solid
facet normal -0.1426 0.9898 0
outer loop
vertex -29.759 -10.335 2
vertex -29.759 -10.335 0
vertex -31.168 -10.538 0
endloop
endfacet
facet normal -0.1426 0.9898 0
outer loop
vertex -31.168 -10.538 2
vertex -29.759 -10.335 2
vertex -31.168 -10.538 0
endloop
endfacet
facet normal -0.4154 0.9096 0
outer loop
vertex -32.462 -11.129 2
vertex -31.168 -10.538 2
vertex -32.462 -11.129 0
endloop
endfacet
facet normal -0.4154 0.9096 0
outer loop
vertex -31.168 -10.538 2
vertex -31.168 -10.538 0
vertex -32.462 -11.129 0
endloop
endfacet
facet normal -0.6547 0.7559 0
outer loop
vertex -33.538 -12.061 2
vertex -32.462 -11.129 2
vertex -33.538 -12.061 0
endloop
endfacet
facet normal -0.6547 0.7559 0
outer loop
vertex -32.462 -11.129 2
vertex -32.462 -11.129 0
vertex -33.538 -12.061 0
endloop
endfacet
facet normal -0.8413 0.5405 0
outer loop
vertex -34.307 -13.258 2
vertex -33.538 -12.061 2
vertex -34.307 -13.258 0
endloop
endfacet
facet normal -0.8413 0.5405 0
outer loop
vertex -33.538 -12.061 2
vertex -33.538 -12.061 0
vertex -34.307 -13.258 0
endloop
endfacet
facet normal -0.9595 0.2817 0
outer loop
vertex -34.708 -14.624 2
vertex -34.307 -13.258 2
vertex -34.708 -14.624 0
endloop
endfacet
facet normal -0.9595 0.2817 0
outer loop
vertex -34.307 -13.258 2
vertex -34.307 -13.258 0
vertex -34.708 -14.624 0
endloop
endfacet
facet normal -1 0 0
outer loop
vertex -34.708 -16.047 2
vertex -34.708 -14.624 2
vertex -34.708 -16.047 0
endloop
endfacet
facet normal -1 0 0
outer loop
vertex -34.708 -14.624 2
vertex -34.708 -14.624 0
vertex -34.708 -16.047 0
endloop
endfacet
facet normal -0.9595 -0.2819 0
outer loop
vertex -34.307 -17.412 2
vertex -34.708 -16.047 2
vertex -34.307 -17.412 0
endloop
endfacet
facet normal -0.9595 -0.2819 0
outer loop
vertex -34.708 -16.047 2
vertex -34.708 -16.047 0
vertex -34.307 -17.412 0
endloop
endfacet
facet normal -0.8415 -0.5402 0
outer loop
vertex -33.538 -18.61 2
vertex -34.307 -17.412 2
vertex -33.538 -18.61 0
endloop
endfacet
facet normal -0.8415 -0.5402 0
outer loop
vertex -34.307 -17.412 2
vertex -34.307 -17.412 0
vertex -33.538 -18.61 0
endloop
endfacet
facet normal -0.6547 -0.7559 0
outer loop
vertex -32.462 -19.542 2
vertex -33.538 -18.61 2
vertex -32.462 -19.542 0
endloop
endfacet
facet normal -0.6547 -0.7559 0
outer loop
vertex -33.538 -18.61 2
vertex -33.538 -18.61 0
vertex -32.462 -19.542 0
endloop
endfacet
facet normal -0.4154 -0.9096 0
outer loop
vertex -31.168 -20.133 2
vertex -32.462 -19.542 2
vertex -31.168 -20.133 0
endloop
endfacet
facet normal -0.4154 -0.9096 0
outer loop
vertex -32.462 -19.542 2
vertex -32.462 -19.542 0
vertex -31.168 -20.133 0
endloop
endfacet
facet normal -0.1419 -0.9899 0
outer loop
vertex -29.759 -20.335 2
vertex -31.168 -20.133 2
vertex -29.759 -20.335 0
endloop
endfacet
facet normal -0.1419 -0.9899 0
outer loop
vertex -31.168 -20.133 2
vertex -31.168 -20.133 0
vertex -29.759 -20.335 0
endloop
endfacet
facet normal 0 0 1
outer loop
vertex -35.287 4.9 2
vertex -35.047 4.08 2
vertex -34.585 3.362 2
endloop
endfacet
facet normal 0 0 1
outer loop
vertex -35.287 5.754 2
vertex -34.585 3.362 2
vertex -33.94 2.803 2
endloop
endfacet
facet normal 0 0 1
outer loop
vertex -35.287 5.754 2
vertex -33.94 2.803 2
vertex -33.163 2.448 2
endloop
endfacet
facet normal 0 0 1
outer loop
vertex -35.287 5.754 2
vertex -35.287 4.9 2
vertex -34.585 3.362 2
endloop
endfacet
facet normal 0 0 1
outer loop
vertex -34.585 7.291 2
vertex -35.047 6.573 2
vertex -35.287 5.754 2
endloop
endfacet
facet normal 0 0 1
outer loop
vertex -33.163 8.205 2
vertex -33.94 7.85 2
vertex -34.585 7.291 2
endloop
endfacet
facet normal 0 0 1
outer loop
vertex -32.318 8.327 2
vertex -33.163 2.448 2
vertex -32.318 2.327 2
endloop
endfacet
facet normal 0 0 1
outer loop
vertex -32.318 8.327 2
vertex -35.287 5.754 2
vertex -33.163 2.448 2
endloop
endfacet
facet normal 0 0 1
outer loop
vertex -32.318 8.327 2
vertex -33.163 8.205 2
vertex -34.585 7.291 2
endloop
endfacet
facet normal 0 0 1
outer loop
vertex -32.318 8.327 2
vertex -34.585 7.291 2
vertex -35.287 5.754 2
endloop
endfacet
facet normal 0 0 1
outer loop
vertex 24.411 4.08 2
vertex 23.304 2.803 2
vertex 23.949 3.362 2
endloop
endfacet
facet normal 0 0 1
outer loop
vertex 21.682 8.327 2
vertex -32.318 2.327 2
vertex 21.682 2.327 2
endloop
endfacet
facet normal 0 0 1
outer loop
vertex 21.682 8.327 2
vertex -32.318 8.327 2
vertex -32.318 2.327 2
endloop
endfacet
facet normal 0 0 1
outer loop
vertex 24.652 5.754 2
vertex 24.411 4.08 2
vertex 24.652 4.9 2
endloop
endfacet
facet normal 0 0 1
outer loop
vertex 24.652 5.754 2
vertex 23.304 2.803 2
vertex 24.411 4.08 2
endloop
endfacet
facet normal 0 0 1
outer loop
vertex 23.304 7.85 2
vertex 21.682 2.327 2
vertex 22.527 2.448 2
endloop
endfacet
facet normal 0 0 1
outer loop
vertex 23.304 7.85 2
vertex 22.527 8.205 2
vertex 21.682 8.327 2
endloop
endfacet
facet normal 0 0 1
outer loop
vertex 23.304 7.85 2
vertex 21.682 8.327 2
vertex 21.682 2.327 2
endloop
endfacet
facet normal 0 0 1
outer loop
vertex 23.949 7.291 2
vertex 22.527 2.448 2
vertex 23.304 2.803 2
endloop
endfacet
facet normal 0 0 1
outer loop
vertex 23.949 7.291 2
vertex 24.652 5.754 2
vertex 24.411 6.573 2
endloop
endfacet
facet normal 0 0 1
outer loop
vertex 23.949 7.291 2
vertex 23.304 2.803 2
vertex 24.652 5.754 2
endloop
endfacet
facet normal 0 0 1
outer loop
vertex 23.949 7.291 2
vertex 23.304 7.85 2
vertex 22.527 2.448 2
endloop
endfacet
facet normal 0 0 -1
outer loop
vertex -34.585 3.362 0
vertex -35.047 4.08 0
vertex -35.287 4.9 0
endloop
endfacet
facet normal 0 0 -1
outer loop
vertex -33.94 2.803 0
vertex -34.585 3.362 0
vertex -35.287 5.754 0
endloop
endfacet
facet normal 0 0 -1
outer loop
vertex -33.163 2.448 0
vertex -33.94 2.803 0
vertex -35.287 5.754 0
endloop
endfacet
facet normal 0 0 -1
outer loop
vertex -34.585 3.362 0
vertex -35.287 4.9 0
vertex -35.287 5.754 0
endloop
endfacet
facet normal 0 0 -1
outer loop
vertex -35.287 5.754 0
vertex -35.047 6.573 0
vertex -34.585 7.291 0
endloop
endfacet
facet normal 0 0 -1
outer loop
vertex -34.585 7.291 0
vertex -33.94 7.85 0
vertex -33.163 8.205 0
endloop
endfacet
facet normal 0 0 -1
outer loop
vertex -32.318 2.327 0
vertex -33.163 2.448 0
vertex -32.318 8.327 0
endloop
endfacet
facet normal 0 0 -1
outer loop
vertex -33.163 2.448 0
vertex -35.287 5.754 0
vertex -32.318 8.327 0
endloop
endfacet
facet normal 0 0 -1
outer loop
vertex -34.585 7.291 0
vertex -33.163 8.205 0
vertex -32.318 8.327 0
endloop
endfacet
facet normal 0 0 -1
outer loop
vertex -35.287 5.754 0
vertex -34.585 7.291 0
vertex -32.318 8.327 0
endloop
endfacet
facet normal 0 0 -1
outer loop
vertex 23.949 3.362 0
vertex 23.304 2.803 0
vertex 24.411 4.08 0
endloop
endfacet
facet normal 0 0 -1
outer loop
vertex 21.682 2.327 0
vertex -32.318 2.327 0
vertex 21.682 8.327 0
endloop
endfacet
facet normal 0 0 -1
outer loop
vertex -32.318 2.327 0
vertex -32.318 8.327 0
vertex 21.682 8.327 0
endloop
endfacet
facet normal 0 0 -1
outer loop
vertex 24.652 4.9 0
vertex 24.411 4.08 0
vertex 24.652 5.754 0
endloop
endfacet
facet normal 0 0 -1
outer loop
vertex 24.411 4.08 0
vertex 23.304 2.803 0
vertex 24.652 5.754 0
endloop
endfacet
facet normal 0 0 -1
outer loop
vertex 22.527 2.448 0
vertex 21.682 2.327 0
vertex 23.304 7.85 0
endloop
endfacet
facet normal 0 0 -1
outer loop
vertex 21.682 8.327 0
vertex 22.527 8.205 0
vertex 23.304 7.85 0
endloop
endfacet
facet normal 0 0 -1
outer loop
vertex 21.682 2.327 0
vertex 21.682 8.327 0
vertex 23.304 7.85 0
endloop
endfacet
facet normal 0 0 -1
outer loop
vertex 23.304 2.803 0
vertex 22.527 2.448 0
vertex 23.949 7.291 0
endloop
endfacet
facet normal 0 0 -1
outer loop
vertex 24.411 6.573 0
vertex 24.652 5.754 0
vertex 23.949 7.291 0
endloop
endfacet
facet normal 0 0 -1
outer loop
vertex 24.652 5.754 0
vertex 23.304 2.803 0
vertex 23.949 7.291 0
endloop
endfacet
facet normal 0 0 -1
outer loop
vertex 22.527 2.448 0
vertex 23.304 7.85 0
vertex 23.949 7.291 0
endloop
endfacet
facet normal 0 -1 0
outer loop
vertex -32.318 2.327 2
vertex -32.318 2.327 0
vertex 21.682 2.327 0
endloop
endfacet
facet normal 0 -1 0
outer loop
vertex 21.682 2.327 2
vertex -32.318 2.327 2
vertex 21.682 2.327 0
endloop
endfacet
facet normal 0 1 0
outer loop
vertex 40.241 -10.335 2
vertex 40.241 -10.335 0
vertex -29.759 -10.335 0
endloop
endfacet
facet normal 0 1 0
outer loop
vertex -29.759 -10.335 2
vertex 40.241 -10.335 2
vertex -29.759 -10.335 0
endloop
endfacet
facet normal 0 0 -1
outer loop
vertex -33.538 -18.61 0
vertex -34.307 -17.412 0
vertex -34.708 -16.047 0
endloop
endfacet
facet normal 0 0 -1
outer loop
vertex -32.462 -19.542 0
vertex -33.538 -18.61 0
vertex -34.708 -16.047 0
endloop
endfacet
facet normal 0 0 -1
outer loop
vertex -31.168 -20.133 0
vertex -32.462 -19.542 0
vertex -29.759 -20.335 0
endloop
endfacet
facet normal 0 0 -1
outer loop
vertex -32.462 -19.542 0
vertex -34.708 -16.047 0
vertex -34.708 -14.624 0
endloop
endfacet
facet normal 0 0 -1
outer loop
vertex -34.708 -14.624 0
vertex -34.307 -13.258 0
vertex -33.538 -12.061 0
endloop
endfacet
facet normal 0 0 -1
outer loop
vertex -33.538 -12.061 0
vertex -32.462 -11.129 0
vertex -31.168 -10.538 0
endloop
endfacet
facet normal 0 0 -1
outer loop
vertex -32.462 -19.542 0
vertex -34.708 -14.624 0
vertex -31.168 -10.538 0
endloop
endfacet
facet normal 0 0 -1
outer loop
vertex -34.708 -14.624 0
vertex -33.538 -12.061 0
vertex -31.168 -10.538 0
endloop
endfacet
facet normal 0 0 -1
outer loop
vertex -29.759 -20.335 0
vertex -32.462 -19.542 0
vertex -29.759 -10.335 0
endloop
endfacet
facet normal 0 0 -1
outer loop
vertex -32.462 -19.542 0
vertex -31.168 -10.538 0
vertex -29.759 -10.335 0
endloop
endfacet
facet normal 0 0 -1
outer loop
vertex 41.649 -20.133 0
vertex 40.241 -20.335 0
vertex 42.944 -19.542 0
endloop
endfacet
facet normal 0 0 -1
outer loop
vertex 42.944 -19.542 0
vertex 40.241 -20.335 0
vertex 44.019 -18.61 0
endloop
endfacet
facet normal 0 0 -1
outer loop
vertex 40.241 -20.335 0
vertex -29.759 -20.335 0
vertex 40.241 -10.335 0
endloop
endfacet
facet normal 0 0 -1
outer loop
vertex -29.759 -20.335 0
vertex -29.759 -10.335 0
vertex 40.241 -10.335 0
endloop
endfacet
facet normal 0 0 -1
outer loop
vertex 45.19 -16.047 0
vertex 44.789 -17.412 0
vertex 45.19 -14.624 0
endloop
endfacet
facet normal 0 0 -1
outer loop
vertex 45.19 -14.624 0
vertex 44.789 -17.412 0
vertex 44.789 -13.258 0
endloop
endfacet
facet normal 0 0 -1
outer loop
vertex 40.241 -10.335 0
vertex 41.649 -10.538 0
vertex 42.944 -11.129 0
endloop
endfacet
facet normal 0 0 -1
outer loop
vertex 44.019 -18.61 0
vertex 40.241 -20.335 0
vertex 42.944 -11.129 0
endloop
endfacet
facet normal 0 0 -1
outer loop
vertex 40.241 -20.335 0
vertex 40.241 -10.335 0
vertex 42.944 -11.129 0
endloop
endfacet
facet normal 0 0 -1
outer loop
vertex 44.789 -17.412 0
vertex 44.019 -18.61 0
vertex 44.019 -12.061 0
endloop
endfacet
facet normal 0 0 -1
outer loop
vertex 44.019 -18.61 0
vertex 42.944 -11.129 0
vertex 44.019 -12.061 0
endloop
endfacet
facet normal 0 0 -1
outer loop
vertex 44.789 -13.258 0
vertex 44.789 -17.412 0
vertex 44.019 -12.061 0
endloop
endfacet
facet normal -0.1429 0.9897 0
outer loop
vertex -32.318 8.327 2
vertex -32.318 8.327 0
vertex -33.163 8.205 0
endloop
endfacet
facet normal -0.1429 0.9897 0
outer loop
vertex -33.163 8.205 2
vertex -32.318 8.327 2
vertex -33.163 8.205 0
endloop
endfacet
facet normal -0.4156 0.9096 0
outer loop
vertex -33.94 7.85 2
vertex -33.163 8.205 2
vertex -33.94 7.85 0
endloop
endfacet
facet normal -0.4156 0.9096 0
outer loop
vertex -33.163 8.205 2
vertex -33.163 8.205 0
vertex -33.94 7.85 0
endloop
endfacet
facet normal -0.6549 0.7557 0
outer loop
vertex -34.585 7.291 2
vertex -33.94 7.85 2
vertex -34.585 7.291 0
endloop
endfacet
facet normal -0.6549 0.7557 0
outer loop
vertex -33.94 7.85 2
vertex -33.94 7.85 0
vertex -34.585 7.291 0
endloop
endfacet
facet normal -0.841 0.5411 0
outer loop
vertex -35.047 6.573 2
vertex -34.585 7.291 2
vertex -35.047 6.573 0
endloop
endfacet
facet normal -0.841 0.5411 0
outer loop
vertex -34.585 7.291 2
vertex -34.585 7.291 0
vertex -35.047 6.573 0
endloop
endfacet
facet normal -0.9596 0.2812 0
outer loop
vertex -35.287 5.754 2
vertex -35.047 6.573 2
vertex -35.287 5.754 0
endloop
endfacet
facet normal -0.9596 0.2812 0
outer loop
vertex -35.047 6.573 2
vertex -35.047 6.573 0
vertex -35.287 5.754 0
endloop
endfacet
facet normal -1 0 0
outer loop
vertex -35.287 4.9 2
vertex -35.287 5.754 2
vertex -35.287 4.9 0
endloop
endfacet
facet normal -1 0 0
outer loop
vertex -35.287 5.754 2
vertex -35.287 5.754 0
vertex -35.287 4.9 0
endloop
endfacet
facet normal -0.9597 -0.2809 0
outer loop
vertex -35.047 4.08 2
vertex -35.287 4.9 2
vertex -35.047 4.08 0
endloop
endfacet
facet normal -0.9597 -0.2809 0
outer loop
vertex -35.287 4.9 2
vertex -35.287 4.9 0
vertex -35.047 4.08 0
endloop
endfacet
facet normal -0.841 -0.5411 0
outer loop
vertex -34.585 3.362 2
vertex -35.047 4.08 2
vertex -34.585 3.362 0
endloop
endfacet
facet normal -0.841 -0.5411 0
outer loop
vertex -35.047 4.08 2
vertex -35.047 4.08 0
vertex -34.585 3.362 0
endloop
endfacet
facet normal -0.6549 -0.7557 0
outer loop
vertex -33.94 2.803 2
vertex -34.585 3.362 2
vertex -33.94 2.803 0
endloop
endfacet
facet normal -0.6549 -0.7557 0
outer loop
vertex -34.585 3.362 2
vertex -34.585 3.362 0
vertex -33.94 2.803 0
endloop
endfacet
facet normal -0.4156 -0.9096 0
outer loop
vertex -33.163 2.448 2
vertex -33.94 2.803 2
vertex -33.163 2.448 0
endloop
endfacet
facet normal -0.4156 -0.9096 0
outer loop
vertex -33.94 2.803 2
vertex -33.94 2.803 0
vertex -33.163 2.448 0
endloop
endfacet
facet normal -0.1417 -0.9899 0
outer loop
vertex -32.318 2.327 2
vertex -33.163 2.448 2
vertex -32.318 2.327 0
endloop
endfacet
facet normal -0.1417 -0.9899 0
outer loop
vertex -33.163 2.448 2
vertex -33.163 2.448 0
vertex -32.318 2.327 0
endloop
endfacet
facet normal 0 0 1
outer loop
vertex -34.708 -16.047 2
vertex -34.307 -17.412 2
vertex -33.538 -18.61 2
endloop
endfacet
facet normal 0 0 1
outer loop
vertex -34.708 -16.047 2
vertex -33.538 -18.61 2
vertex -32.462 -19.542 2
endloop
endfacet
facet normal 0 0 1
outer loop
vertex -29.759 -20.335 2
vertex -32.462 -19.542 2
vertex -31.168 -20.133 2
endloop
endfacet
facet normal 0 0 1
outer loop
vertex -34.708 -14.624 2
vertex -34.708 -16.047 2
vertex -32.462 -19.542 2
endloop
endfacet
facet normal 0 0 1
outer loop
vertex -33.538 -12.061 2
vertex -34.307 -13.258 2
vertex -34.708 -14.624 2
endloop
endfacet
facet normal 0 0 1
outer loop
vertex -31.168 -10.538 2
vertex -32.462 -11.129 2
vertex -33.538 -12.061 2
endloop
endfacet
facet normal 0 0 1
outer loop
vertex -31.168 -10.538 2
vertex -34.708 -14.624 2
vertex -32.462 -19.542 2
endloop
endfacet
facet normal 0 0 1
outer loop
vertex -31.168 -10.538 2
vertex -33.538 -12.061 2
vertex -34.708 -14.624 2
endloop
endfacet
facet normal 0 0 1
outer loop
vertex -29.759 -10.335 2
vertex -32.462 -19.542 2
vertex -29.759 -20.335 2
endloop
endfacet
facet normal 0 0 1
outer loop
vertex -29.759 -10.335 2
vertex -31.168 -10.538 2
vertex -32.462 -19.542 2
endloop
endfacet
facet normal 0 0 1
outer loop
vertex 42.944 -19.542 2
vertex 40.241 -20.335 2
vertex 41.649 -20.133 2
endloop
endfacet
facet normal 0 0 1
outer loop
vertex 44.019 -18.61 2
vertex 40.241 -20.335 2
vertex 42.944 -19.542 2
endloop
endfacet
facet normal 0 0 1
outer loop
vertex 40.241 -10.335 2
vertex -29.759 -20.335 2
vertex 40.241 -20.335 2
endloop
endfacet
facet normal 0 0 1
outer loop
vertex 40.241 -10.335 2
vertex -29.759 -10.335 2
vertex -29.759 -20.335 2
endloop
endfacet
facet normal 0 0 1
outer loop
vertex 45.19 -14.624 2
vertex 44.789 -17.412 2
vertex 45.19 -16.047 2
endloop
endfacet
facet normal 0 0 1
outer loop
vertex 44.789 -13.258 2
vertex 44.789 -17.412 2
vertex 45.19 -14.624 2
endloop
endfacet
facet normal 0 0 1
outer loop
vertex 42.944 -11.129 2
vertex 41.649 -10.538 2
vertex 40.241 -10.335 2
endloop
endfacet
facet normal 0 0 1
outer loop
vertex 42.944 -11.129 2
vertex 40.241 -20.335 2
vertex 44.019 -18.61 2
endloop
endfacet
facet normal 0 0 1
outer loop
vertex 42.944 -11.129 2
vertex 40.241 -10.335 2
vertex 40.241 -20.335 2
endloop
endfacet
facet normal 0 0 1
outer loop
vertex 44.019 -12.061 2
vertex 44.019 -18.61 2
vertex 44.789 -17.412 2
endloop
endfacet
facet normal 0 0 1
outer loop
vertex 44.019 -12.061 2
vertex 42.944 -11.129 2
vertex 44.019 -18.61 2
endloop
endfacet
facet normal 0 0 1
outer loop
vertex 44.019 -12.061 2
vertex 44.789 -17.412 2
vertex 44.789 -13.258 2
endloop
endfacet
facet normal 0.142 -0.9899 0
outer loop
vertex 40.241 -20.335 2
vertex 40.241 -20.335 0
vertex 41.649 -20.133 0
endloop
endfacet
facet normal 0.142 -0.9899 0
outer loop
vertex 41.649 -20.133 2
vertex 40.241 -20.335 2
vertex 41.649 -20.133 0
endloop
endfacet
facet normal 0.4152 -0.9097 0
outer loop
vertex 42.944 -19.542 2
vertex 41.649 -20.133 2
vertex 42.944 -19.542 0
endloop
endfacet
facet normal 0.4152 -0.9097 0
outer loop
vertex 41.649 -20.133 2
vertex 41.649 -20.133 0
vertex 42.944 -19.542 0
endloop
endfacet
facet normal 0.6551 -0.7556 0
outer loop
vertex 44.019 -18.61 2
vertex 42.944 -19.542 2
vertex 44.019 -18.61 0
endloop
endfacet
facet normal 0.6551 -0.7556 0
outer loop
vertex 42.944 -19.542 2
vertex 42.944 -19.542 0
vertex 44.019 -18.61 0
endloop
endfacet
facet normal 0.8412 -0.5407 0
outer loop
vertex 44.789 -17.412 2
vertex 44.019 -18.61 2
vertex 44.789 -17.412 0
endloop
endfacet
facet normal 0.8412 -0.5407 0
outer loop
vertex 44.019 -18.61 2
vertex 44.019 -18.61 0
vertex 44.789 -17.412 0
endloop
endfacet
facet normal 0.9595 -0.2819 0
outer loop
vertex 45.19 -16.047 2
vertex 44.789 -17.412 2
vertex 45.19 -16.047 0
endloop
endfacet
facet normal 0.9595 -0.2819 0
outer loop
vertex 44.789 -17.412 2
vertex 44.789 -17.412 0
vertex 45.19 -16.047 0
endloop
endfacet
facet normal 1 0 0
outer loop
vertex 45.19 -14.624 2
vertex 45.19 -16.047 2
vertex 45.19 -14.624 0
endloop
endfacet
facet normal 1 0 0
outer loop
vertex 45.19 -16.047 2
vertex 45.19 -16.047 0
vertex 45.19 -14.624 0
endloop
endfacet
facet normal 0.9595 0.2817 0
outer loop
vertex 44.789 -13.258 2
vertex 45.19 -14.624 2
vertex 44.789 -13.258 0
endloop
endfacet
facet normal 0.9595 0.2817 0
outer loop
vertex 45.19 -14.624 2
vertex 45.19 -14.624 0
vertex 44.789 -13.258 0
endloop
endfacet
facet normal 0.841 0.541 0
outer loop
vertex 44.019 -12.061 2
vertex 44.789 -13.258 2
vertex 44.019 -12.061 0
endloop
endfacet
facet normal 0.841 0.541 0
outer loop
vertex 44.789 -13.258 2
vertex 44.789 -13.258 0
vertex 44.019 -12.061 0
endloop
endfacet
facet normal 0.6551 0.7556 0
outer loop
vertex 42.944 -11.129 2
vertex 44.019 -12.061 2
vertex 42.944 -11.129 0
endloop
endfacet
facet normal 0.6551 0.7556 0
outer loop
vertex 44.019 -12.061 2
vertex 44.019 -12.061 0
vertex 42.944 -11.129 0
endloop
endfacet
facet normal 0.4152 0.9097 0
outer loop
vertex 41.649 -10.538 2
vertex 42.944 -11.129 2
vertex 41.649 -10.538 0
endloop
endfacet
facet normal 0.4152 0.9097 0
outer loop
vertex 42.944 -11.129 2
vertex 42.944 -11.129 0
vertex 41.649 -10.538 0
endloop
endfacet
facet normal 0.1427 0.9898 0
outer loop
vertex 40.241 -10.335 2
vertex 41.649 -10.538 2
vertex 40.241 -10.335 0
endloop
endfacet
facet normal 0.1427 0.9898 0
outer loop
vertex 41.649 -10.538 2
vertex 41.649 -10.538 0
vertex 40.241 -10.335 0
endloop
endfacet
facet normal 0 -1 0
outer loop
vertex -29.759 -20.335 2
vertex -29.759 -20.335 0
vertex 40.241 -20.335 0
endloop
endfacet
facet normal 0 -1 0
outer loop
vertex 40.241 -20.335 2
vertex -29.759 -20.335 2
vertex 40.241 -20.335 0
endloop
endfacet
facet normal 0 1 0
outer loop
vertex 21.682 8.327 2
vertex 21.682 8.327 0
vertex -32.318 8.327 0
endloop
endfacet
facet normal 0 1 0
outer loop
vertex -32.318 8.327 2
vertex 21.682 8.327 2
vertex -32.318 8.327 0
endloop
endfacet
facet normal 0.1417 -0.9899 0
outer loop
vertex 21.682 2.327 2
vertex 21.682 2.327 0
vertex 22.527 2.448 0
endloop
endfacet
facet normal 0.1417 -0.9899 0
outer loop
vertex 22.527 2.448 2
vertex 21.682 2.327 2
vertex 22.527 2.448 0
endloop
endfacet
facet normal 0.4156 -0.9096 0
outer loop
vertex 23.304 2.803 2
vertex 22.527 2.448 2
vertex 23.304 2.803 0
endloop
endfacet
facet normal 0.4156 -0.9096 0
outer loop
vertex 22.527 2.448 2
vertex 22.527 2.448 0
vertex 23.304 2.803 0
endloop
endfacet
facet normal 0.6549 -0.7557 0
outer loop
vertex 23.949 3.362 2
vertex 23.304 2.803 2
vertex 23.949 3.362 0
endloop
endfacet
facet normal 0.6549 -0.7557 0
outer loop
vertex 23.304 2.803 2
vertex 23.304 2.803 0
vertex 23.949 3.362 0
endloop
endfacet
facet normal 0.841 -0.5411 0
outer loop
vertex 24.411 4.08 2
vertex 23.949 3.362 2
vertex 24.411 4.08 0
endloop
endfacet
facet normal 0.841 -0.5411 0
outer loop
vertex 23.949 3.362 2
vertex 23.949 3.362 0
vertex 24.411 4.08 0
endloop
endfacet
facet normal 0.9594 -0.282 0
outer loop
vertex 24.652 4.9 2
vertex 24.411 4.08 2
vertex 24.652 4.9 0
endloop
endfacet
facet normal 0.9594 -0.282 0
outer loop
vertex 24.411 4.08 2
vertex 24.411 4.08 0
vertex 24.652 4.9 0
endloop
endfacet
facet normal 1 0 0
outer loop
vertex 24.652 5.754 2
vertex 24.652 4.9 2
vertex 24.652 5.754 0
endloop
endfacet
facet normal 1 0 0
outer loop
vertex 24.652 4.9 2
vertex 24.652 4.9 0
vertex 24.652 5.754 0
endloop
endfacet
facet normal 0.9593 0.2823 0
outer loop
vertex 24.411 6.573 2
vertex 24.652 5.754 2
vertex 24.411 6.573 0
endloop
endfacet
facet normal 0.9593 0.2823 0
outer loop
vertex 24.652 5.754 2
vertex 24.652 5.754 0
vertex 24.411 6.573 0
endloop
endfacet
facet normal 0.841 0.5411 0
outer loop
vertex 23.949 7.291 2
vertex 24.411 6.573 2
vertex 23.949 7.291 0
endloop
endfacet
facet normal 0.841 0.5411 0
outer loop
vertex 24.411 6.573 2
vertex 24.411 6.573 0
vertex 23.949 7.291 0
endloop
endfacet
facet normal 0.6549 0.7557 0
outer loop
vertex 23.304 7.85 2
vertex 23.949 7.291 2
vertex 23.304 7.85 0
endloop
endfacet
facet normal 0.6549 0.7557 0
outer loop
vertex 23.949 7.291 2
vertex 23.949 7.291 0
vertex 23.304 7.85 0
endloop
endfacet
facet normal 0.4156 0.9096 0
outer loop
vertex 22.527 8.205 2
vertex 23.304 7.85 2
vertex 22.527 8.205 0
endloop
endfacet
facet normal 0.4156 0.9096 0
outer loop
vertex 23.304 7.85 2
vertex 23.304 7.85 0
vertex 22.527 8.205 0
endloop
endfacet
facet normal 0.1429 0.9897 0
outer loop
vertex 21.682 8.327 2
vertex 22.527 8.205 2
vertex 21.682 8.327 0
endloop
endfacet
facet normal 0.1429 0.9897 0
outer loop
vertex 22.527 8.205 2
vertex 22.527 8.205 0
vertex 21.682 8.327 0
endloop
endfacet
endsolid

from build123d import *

# Parameters (mm, degrees)
F1_DEPTH = 2
F2_DEPTH = 2


with BuildPart() as f1:
    # F0 (on Top) → F1 (new body)
    with BuildSketch(Plane.XY):
        with BuildLine():
            Line((21.682061, 8.326693), (-32.317939, 8.326693))
            ThreePointArc((-32.317939, 8.326693), (-35.317939, 5.326693), (-32.317939, 2.326693))
            Line((-32.317939, 2.326693), (21.682061, 2.326693))
            ThreePointArc((21.682061, 2.326693), (24.682061, 5.326693), (21.682061, 8.326693))
        make_face()
    extrude(amount=F1_DEPTH)


with BuildPart() as f2:
    # F0 (on Top) → F2 (new body)
    with BuildSketch(Plane.XY):
        with BuildLine():
            Line((40.240743, -10.335269), (-29.759257, -10.335269))
            ThreePointArc((-29.759257, -10.335269), (-34.759257, -15.335269), (-29.759257, -20.335269))
            Line((-29.759257, -20.335269), (40.240743, -20.335269))
            ThreePointArc((40.240743, -20.335269), (45.240743, -15.335269), (40.240743, -10.335269))
        make_face()
    extrude(amount=F2_DEPTH)


solid = Compound([f1.part, f2.part])
